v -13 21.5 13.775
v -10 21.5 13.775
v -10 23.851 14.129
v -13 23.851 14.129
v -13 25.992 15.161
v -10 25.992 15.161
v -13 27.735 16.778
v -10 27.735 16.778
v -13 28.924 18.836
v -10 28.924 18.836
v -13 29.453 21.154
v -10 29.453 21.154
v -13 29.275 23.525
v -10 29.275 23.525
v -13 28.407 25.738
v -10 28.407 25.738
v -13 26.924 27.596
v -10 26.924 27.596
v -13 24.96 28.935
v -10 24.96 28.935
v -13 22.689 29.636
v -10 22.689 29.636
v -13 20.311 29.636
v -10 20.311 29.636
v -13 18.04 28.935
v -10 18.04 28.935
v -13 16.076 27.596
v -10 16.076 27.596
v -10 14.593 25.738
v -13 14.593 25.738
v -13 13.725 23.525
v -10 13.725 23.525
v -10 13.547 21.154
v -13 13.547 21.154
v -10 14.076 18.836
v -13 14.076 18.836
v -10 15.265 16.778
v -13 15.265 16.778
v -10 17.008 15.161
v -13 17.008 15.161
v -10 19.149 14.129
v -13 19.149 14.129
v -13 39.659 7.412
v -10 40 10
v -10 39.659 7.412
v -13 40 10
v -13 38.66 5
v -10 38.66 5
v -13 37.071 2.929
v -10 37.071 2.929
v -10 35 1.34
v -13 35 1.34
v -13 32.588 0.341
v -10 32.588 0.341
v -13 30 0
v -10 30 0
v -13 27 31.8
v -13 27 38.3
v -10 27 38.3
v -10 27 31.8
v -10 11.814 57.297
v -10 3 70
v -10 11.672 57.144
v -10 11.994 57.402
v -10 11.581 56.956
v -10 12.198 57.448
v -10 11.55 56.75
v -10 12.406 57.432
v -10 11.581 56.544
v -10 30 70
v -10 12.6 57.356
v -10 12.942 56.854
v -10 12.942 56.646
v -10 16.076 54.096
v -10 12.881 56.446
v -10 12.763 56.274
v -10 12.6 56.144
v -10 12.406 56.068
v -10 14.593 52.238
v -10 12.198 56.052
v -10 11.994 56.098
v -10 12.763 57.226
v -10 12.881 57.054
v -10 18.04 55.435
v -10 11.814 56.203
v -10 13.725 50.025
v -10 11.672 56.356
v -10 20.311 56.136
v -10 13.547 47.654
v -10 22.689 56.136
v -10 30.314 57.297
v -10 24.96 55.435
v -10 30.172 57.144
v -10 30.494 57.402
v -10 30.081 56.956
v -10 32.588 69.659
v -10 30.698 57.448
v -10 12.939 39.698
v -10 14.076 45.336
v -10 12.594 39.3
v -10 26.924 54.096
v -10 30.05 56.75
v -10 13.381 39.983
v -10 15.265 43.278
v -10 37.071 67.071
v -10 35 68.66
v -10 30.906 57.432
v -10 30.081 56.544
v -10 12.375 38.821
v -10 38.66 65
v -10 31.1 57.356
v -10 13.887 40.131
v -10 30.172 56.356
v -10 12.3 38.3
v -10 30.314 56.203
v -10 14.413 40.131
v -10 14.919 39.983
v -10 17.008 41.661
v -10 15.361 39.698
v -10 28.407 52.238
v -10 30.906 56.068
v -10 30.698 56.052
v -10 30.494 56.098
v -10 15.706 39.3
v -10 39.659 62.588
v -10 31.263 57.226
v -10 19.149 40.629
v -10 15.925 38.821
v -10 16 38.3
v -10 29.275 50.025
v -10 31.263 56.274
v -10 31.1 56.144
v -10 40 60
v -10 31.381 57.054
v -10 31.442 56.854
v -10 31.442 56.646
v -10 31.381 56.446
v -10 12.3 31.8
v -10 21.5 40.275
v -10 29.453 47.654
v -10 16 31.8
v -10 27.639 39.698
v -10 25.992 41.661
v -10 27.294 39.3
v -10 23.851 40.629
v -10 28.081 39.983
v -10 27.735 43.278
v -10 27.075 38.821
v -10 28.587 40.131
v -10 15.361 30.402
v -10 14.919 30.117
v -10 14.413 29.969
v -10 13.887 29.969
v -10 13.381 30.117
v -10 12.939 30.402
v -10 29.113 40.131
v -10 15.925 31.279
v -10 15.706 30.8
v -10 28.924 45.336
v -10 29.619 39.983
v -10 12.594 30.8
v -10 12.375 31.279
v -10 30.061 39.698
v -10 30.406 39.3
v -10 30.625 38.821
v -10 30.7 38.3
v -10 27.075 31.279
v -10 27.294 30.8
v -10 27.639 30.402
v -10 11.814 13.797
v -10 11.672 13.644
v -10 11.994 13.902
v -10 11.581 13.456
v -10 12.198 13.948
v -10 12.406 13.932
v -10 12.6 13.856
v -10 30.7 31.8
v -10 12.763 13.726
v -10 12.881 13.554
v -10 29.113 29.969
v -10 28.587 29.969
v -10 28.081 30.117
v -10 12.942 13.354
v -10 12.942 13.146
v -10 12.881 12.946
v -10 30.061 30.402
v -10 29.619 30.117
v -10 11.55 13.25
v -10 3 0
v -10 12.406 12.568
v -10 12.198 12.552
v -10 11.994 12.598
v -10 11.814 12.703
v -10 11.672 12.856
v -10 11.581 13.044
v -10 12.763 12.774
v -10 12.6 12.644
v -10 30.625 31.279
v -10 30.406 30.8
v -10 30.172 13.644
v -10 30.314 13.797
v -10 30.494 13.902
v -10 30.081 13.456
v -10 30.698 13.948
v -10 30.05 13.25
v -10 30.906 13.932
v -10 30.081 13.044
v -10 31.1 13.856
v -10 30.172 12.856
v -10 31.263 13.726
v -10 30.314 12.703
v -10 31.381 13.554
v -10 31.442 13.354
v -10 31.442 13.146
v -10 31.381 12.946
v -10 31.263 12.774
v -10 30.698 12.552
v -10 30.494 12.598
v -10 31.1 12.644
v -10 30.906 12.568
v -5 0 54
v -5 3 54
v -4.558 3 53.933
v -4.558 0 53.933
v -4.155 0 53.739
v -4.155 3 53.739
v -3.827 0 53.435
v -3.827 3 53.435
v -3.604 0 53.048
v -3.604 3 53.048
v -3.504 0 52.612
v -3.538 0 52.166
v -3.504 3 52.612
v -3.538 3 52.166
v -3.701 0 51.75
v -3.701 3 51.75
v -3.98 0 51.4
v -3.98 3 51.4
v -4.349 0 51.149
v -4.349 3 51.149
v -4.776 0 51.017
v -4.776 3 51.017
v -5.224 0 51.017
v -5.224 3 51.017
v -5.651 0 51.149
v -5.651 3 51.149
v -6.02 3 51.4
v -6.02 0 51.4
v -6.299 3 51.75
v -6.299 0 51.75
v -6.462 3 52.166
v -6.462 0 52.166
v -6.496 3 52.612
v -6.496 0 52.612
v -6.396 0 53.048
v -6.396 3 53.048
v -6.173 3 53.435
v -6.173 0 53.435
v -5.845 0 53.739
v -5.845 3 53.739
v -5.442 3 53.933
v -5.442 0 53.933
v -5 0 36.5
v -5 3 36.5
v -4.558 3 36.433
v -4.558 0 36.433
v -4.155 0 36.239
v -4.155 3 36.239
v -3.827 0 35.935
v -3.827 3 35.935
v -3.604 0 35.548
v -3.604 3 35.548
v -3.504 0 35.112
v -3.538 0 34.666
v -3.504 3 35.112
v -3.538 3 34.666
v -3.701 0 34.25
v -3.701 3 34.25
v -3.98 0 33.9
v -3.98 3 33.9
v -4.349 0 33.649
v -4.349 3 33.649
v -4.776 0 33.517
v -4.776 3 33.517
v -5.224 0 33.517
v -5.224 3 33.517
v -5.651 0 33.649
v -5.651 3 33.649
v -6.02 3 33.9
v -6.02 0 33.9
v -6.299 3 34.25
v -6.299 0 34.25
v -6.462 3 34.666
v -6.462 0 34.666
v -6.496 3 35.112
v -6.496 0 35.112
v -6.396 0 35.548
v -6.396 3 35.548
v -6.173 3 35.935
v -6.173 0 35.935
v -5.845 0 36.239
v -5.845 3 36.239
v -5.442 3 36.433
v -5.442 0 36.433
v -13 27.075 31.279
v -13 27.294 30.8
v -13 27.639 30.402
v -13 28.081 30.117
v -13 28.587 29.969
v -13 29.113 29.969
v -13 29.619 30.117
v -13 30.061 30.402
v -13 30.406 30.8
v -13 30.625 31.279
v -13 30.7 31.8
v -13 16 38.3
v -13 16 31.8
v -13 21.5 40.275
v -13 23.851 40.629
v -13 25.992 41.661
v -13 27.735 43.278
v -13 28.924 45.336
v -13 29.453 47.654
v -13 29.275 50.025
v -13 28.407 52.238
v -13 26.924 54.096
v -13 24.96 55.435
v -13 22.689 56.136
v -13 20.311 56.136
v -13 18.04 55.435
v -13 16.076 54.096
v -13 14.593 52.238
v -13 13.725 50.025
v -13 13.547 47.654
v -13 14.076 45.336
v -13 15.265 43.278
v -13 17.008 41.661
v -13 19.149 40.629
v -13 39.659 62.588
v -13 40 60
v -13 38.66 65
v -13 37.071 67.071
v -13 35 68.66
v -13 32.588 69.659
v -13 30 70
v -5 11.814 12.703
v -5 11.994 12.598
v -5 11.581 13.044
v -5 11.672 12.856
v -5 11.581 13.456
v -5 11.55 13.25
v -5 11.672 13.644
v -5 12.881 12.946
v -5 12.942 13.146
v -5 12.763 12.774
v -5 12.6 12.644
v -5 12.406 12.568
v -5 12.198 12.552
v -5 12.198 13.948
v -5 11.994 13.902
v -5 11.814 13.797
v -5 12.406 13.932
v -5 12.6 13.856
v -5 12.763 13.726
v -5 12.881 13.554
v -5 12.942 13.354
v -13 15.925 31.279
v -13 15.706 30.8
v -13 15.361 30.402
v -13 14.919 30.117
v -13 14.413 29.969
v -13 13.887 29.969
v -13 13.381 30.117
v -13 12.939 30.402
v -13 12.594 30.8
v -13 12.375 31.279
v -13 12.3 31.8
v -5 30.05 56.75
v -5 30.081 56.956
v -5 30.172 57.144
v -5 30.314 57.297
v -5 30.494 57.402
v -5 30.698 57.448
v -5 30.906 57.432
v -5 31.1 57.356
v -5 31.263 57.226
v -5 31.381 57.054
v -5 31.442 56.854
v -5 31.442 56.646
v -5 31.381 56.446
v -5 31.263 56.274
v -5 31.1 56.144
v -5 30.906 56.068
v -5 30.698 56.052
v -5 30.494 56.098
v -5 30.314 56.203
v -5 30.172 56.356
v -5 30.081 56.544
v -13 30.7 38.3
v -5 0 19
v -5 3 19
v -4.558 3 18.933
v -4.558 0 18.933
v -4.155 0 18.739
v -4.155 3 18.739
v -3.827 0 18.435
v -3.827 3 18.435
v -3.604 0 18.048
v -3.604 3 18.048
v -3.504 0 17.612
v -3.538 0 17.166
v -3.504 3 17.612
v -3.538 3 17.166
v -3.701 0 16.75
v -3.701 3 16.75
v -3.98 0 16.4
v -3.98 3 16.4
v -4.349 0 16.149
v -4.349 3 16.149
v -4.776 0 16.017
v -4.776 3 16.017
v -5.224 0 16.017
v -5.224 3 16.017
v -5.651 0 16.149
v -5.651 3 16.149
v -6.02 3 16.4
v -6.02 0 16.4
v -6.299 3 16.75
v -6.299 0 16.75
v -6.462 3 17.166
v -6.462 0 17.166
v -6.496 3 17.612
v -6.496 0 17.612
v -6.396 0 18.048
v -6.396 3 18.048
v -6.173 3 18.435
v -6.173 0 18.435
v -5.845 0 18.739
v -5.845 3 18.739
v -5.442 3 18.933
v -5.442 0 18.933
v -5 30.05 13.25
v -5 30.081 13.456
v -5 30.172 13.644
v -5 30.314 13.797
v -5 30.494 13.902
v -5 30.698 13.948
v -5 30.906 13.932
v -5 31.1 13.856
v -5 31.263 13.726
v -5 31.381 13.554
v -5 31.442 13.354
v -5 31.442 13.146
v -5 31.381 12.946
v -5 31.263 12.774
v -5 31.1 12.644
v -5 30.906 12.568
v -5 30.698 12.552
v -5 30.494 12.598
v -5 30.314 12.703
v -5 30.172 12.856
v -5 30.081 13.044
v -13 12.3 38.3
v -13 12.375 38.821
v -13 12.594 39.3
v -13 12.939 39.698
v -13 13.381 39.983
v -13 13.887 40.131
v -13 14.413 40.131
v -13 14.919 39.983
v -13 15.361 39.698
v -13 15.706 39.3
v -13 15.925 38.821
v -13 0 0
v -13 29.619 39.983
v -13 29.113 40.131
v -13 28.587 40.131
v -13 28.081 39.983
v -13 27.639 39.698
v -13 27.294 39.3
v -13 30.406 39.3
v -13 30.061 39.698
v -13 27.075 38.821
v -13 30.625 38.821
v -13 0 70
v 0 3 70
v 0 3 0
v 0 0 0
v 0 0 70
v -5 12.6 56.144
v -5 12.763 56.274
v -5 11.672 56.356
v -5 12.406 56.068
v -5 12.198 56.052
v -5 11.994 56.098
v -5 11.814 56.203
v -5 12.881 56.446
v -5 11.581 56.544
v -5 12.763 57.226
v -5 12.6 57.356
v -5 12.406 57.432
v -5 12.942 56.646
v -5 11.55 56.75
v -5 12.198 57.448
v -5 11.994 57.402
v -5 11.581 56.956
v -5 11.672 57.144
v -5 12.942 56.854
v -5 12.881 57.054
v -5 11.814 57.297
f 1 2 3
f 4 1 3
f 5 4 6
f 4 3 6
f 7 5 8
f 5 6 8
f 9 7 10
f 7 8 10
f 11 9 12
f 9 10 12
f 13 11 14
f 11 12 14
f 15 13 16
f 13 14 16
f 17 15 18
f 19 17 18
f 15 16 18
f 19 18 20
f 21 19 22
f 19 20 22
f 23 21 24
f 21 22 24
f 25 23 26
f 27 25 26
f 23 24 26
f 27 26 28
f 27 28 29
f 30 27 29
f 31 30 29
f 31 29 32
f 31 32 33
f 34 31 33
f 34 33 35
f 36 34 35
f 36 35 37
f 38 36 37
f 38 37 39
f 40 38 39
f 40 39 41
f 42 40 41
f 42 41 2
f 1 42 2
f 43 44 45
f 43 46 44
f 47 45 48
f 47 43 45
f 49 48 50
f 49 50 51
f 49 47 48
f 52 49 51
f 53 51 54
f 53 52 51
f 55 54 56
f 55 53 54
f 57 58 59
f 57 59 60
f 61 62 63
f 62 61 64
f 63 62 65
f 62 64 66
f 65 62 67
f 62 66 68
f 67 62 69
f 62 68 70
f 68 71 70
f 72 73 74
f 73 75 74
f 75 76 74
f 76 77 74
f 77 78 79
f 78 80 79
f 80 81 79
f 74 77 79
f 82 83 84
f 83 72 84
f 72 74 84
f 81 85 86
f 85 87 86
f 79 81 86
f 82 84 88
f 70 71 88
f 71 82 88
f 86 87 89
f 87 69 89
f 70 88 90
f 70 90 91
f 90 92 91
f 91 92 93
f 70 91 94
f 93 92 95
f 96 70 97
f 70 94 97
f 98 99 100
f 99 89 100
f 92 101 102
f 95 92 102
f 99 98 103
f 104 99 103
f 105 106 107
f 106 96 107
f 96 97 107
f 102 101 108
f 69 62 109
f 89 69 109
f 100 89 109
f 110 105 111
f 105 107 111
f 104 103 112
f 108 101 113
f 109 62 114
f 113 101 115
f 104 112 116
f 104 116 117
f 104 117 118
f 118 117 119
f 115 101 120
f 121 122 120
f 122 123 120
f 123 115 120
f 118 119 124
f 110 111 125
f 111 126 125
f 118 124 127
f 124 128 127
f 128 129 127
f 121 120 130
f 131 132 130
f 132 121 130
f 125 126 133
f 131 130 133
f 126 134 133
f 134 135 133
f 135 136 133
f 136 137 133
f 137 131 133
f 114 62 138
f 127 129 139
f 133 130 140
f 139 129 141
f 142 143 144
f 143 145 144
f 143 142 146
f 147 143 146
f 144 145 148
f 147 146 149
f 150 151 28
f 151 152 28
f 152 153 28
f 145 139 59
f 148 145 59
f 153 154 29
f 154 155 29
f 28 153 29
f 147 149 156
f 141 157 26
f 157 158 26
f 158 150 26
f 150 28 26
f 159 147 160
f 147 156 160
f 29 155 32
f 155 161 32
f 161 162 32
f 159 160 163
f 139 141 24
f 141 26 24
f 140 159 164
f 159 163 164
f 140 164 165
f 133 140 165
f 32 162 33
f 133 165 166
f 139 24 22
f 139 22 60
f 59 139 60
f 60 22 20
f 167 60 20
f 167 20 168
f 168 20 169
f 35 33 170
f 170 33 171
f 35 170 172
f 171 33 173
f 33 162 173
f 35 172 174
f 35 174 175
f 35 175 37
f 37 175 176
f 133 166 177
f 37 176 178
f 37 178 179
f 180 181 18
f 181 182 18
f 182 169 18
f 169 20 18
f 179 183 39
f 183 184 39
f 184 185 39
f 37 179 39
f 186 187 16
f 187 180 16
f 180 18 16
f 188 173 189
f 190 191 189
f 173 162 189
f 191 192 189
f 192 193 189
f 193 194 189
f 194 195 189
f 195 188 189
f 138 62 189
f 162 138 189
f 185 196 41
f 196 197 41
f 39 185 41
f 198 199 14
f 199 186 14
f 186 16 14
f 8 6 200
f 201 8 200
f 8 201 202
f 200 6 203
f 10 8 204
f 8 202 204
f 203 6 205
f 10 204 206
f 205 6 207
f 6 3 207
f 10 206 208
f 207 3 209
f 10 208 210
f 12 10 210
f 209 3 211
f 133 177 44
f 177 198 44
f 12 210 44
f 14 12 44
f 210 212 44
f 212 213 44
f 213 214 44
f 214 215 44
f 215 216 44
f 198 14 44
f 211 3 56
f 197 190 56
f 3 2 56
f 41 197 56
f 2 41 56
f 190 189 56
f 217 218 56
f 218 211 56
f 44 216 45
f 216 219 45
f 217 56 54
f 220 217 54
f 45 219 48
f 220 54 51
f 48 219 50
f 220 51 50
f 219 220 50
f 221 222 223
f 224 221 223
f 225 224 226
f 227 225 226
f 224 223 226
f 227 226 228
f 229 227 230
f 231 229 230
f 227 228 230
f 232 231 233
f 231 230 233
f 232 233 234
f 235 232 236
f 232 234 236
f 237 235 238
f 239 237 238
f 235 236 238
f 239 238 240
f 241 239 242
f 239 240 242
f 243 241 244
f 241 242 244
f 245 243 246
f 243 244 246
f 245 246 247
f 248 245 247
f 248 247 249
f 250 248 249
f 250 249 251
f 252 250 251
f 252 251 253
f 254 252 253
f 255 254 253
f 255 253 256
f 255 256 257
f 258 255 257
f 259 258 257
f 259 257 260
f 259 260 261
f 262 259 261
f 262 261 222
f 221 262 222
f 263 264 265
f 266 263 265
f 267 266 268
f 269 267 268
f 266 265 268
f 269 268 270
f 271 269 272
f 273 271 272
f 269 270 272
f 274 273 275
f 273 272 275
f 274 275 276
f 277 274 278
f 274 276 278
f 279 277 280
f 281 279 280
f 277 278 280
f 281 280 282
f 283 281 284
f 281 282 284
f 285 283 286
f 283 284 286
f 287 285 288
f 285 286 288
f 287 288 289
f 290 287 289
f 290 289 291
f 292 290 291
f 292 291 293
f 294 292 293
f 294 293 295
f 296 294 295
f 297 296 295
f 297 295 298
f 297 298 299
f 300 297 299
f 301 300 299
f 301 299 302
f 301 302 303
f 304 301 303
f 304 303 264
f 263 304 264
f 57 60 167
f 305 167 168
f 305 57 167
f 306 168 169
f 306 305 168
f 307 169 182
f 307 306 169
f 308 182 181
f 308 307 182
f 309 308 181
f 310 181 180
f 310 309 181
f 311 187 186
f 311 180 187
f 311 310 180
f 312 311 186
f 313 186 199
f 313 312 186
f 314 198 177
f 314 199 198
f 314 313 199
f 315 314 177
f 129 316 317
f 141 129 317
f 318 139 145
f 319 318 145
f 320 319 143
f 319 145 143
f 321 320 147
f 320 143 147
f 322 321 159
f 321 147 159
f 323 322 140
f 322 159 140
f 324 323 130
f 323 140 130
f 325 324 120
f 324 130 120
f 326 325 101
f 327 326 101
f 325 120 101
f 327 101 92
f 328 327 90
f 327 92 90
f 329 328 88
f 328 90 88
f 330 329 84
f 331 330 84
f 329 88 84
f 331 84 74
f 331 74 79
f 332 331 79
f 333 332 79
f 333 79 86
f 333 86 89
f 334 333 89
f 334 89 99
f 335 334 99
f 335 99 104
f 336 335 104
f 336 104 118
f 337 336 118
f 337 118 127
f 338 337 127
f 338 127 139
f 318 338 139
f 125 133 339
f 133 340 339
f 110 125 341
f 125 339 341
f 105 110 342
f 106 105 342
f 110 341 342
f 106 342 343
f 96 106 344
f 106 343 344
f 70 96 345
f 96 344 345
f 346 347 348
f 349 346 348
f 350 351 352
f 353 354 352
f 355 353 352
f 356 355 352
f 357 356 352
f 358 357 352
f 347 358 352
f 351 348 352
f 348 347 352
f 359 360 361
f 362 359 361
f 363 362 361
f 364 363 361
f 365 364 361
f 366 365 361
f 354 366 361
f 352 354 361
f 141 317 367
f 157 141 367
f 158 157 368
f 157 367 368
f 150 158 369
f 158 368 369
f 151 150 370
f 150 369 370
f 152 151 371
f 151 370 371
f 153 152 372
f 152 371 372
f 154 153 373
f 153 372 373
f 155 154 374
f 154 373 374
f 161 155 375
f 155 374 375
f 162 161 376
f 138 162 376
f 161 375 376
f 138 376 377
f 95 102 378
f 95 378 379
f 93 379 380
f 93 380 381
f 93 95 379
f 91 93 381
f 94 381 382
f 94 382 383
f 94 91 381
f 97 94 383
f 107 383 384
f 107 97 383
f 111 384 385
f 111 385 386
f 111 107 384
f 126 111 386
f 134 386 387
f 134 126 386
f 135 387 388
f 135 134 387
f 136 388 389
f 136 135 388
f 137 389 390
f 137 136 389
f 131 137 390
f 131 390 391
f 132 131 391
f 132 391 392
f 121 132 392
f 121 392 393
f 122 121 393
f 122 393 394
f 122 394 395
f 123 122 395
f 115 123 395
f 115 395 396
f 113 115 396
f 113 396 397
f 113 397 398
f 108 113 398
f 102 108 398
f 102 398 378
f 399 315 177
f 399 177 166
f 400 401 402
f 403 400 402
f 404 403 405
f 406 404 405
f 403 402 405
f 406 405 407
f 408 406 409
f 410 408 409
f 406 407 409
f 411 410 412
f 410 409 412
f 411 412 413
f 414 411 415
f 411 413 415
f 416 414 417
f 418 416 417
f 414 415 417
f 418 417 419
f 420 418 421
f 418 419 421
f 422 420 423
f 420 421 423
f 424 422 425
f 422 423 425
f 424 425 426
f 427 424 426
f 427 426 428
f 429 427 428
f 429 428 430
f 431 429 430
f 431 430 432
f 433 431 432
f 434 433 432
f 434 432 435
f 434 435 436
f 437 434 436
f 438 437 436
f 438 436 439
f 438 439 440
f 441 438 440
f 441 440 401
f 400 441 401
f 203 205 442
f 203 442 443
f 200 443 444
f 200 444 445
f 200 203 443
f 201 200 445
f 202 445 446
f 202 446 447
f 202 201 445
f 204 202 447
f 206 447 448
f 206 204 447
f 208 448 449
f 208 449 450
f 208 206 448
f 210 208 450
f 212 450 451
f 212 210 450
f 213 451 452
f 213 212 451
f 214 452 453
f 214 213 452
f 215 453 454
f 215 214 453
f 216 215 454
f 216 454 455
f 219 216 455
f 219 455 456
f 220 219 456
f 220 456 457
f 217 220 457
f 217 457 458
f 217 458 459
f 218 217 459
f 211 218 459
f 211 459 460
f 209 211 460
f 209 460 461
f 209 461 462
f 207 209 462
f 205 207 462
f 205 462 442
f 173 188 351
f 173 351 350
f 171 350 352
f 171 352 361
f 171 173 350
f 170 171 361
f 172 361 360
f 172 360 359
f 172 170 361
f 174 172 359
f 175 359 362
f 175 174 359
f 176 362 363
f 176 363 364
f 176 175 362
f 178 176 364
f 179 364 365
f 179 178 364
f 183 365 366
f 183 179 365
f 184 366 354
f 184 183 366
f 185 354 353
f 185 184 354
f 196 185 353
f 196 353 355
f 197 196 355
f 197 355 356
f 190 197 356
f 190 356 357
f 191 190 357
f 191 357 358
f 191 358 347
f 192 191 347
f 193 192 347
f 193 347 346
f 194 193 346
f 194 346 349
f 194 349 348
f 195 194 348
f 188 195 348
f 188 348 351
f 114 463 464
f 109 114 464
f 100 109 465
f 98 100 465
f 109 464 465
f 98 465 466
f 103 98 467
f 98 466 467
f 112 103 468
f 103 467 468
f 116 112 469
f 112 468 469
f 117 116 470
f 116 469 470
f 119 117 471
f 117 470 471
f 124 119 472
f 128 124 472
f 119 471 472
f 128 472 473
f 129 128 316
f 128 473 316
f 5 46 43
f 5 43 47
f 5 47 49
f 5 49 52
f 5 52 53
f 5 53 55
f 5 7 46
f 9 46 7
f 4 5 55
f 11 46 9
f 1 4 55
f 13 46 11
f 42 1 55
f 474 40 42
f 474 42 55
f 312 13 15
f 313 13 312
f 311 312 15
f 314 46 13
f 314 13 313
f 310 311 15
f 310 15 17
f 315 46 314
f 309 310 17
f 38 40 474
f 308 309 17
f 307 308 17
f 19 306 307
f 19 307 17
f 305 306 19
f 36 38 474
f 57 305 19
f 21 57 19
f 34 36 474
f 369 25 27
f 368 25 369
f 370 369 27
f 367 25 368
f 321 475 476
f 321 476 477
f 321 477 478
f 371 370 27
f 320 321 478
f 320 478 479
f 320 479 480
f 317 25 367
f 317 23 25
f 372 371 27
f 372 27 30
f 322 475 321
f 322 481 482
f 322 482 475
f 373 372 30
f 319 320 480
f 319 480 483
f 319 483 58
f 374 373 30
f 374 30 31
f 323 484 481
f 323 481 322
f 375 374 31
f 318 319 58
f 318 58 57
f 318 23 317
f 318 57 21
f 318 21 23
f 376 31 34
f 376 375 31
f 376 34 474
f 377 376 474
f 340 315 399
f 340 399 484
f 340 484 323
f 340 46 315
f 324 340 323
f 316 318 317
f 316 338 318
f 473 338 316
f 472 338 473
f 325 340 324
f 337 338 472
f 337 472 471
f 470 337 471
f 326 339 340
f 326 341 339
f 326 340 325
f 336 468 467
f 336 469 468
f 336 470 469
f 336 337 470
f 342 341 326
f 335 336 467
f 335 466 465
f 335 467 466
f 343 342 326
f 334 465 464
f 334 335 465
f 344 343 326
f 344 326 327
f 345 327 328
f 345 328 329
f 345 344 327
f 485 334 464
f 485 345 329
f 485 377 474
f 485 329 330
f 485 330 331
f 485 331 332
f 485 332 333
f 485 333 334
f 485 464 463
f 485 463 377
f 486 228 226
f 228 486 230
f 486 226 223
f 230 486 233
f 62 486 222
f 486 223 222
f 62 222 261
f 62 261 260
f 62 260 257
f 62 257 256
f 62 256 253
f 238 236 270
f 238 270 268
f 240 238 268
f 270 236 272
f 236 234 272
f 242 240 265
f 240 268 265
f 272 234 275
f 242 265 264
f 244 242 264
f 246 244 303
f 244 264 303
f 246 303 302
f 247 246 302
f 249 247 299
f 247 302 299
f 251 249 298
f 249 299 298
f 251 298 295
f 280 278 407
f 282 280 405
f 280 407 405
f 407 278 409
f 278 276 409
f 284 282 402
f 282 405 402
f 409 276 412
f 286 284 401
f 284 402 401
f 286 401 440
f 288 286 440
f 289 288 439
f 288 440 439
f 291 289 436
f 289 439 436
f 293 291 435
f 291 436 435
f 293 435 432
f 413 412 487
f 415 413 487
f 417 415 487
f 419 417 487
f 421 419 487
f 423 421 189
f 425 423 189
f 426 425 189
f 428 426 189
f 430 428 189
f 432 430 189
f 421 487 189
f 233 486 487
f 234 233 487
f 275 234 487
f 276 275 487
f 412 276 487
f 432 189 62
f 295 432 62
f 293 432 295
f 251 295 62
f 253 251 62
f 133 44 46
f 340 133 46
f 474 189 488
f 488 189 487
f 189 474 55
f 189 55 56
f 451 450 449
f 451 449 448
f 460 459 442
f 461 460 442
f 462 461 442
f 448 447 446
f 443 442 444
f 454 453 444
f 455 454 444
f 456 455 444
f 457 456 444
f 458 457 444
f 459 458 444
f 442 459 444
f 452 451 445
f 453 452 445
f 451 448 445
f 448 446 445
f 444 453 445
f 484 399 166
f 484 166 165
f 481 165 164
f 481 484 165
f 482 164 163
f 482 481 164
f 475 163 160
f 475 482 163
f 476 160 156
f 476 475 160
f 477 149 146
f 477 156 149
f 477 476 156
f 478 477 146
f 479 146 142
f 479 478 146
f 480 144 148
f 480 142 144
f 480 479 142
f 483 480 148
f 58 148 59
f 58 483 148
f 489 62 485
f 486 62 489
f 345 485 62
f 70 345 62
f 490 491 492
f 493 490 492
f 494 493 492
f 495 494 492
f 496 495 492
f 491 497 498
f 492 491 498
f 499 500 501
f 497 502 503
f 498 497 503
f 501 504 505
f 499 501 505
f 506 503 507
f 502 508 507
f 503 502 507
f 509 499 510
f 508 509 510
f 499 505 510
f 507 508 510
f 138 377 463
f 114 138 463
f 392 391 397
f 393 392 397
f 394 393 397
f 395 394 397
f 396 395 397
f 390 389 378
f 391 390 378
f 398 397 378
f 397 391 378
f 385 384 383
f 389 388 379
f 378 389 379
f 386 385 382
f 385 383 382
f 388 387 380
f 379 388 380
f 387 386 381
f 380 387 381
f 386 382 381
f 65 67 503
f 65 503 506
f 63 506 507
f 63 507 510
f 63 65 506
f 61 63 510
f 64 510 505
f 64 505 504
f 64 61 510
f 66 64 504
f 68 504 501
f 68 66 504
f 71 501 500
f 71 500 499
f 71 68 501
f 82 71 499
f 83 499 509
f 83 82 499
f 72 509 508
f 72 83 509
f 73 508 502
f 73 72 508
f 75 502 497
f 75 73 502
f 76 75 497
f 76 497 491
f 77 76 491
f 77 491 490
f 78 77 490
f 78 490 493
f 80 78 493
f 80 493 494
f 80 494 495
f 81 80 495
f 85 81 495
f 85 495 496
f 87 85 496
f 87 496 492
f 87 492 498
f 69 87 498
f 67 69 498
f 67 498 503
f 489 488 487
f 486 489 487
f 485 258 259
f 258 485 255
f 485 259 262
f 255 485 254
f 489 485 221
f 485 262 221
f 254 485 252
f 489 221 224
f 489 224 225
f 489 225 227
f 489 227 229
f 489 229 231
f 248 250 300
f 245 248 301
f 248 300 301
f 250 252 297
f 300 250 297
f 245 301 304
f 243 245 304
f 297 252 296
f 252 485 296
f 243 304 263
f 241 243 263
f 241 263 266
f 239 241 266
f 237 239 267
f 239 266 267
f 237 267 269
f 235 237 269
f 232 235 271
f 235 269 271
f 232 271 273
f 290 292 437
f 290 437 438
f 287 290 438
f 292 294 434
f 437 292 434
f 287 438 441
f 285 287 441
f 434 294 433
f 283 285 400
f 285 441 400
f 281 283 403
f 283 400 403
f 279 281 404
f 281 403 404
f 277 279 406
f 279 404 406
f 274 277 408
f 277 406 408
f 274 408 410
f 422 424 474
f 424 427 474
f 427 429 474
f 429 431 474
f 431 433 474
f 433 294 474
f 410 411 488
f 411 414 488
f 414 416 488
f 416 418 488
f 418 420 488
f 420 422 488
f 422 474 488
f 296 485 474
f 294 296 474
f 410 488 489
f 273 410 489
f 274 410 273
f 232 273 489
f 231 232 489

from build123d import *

# Parameters (mm, degrees)
BOSS_EXTRUDE1_DEPTH = 70
SKETCH2_R           = 7.975
CUT_EXTRUDE9_DEPTH  = 82.240384046
SKETCH2_12_R        = 7.975
CUT_EXTRUDE10_DEPTH = 82.240384046
FILLET1_R           = 10
FILLET2_R           = 10
SKETCH3_R           = 1.5
CUT_EXTRUDE11_DEPTH = 81.237148504
CUT_EXTRUDE12_DEPTH = 82.663945533
SKETCH6_R           = 0.7
BOSS_EXTRUDE2_DEPTH = 8


# Read off the part's stored shape, not the designer's step: Boss-Extrude1
with BuildPart() as part:
    # Boss-Extrude1 outline → Boss-Extrude1 (new body)
    with BuildSketch(Plane.XY):
        Polygon((-10, 40), (-13, 40), (-13, 0), (0, 0), (0, 3), (-10, 3), align=None)
    extrude(amount=BOSS_EXTRUDE1_DEPTH)

    # Sketch2 → Cut-Extrude9 (cut, through all)
    with BuildSketch(Plane(origin=(-10, 0, 0), x_dir=(0, 0, -1), z_dir=(1, 0, 0))):
        with Locations((-48.25, 21.5)):
            Circle(SKETCH2_R)
    extrude(amount=-CUT_EXTRUDE9_DEPTH, mode=Mode.SUBTRACT)

    # Sketch2<12> → Cut-Extrude10 (cut, through all)
    with BuildSketch(Plane(origin=(-10, 0, 0), x_dir=(0, 0, -1), z_dir=(1, 0, 0))):
        with Locations((-21.75, 21.5)):
            Circle(SKETCH2_12_R)
    extrude(amount=-CUT_EXTRUDE10_DEPTH, mode=Mode.SUBTRACT)

    # Fillet1
    fillet1_edges = [part.edges().sort_by_distance(p)[0] for p in [
        (-11.5, 40, 70),
    ]]
    fillet(fillet1_edges, radius=FILLET1_R)

    # Fillet2
    fillet2_edges = [part.edges().sort_by_distance(p)[0] for p in [
        (-11.5, 40, 0),
    ]]
    fillet(fillet2_edges, radius=FILLET2_R)

    # Sketch3 → Cut-Extrude11 (cut, through all)
    with BuildSketch(Plane(origin=(0, 3, 0), x_dir=(1, 0, 0), z_dir=(0, 1, 0))):
        with Locations(Location((-5, -35, 0), (0, 0, 270))):
            Circle(SKETCH3_R)
        with Locations(Location((-5, -52.5, 0), (0, 0, 270))):
            Circle(SKETCH3_R)
        with Locations(Location((-5, -17.5, 0), (0, 0, 270))):
            Circle(SKETCH3_R)
    extrude(amount=-CUT_EXTRUDE11_DEPTH, mode=Mode.SUBTRACT)

    # Sketch4 → Cut-Extrude12 (cut, through all)
    with BuildSketch(Plane.ZY.offset(13)):
        with BuildLine():
            Line((38.3, 27), (31.8, 27))
            ThreePointArc((31.8, 27), (29.95, 28.85), (31.8, 30.7))
            Line((31.8, 30.7), (38.3, 30.7))
            ThreePointArc((38.3, 30.7), (40.15, 28.85), (38.3, 27))
        make_face()
        with BuildLine():
            Line((38.3, 16), (31.8, 16))
            ThreePointArc((31.8, 16), (29.95, 14.15), (31.8, 12.3))
            Line((31.8, 12.3), (38.3, 12.3))
            ThreePointArc((38.3, 12.3), (40.15, 14.15), (38.3, 16))
        make_face()
    extrude(amount=-CUT_EXTRUDE12_DEPTH, mode=Mode.SUBTRACT)

    # Sketch6 → Boss-Extrude2 (add)
    with BuildSketch(Plane.ZY.offset(13)):
        with Locations(Location((56.75, 30.75, 0), (0, 0, 270))):
            Circle(SKETCH6_R)
        with Locations(Location((56.75, 12.25, 0), (0, 0, 270))):
            Circle(SKETCH6_R)
        with Locations(Location((13.25, 30.75, 0), (0, 0, 270))):
            Circle(SKETCH6_R)
        with Locations(Location((13.25, 12.25, 0), (0, 0, 270))):
            Circle(SKETCH6_R)
    extrude(amount=-BOSS_EXTRUDE2_DEPTH)


solid = part.part
